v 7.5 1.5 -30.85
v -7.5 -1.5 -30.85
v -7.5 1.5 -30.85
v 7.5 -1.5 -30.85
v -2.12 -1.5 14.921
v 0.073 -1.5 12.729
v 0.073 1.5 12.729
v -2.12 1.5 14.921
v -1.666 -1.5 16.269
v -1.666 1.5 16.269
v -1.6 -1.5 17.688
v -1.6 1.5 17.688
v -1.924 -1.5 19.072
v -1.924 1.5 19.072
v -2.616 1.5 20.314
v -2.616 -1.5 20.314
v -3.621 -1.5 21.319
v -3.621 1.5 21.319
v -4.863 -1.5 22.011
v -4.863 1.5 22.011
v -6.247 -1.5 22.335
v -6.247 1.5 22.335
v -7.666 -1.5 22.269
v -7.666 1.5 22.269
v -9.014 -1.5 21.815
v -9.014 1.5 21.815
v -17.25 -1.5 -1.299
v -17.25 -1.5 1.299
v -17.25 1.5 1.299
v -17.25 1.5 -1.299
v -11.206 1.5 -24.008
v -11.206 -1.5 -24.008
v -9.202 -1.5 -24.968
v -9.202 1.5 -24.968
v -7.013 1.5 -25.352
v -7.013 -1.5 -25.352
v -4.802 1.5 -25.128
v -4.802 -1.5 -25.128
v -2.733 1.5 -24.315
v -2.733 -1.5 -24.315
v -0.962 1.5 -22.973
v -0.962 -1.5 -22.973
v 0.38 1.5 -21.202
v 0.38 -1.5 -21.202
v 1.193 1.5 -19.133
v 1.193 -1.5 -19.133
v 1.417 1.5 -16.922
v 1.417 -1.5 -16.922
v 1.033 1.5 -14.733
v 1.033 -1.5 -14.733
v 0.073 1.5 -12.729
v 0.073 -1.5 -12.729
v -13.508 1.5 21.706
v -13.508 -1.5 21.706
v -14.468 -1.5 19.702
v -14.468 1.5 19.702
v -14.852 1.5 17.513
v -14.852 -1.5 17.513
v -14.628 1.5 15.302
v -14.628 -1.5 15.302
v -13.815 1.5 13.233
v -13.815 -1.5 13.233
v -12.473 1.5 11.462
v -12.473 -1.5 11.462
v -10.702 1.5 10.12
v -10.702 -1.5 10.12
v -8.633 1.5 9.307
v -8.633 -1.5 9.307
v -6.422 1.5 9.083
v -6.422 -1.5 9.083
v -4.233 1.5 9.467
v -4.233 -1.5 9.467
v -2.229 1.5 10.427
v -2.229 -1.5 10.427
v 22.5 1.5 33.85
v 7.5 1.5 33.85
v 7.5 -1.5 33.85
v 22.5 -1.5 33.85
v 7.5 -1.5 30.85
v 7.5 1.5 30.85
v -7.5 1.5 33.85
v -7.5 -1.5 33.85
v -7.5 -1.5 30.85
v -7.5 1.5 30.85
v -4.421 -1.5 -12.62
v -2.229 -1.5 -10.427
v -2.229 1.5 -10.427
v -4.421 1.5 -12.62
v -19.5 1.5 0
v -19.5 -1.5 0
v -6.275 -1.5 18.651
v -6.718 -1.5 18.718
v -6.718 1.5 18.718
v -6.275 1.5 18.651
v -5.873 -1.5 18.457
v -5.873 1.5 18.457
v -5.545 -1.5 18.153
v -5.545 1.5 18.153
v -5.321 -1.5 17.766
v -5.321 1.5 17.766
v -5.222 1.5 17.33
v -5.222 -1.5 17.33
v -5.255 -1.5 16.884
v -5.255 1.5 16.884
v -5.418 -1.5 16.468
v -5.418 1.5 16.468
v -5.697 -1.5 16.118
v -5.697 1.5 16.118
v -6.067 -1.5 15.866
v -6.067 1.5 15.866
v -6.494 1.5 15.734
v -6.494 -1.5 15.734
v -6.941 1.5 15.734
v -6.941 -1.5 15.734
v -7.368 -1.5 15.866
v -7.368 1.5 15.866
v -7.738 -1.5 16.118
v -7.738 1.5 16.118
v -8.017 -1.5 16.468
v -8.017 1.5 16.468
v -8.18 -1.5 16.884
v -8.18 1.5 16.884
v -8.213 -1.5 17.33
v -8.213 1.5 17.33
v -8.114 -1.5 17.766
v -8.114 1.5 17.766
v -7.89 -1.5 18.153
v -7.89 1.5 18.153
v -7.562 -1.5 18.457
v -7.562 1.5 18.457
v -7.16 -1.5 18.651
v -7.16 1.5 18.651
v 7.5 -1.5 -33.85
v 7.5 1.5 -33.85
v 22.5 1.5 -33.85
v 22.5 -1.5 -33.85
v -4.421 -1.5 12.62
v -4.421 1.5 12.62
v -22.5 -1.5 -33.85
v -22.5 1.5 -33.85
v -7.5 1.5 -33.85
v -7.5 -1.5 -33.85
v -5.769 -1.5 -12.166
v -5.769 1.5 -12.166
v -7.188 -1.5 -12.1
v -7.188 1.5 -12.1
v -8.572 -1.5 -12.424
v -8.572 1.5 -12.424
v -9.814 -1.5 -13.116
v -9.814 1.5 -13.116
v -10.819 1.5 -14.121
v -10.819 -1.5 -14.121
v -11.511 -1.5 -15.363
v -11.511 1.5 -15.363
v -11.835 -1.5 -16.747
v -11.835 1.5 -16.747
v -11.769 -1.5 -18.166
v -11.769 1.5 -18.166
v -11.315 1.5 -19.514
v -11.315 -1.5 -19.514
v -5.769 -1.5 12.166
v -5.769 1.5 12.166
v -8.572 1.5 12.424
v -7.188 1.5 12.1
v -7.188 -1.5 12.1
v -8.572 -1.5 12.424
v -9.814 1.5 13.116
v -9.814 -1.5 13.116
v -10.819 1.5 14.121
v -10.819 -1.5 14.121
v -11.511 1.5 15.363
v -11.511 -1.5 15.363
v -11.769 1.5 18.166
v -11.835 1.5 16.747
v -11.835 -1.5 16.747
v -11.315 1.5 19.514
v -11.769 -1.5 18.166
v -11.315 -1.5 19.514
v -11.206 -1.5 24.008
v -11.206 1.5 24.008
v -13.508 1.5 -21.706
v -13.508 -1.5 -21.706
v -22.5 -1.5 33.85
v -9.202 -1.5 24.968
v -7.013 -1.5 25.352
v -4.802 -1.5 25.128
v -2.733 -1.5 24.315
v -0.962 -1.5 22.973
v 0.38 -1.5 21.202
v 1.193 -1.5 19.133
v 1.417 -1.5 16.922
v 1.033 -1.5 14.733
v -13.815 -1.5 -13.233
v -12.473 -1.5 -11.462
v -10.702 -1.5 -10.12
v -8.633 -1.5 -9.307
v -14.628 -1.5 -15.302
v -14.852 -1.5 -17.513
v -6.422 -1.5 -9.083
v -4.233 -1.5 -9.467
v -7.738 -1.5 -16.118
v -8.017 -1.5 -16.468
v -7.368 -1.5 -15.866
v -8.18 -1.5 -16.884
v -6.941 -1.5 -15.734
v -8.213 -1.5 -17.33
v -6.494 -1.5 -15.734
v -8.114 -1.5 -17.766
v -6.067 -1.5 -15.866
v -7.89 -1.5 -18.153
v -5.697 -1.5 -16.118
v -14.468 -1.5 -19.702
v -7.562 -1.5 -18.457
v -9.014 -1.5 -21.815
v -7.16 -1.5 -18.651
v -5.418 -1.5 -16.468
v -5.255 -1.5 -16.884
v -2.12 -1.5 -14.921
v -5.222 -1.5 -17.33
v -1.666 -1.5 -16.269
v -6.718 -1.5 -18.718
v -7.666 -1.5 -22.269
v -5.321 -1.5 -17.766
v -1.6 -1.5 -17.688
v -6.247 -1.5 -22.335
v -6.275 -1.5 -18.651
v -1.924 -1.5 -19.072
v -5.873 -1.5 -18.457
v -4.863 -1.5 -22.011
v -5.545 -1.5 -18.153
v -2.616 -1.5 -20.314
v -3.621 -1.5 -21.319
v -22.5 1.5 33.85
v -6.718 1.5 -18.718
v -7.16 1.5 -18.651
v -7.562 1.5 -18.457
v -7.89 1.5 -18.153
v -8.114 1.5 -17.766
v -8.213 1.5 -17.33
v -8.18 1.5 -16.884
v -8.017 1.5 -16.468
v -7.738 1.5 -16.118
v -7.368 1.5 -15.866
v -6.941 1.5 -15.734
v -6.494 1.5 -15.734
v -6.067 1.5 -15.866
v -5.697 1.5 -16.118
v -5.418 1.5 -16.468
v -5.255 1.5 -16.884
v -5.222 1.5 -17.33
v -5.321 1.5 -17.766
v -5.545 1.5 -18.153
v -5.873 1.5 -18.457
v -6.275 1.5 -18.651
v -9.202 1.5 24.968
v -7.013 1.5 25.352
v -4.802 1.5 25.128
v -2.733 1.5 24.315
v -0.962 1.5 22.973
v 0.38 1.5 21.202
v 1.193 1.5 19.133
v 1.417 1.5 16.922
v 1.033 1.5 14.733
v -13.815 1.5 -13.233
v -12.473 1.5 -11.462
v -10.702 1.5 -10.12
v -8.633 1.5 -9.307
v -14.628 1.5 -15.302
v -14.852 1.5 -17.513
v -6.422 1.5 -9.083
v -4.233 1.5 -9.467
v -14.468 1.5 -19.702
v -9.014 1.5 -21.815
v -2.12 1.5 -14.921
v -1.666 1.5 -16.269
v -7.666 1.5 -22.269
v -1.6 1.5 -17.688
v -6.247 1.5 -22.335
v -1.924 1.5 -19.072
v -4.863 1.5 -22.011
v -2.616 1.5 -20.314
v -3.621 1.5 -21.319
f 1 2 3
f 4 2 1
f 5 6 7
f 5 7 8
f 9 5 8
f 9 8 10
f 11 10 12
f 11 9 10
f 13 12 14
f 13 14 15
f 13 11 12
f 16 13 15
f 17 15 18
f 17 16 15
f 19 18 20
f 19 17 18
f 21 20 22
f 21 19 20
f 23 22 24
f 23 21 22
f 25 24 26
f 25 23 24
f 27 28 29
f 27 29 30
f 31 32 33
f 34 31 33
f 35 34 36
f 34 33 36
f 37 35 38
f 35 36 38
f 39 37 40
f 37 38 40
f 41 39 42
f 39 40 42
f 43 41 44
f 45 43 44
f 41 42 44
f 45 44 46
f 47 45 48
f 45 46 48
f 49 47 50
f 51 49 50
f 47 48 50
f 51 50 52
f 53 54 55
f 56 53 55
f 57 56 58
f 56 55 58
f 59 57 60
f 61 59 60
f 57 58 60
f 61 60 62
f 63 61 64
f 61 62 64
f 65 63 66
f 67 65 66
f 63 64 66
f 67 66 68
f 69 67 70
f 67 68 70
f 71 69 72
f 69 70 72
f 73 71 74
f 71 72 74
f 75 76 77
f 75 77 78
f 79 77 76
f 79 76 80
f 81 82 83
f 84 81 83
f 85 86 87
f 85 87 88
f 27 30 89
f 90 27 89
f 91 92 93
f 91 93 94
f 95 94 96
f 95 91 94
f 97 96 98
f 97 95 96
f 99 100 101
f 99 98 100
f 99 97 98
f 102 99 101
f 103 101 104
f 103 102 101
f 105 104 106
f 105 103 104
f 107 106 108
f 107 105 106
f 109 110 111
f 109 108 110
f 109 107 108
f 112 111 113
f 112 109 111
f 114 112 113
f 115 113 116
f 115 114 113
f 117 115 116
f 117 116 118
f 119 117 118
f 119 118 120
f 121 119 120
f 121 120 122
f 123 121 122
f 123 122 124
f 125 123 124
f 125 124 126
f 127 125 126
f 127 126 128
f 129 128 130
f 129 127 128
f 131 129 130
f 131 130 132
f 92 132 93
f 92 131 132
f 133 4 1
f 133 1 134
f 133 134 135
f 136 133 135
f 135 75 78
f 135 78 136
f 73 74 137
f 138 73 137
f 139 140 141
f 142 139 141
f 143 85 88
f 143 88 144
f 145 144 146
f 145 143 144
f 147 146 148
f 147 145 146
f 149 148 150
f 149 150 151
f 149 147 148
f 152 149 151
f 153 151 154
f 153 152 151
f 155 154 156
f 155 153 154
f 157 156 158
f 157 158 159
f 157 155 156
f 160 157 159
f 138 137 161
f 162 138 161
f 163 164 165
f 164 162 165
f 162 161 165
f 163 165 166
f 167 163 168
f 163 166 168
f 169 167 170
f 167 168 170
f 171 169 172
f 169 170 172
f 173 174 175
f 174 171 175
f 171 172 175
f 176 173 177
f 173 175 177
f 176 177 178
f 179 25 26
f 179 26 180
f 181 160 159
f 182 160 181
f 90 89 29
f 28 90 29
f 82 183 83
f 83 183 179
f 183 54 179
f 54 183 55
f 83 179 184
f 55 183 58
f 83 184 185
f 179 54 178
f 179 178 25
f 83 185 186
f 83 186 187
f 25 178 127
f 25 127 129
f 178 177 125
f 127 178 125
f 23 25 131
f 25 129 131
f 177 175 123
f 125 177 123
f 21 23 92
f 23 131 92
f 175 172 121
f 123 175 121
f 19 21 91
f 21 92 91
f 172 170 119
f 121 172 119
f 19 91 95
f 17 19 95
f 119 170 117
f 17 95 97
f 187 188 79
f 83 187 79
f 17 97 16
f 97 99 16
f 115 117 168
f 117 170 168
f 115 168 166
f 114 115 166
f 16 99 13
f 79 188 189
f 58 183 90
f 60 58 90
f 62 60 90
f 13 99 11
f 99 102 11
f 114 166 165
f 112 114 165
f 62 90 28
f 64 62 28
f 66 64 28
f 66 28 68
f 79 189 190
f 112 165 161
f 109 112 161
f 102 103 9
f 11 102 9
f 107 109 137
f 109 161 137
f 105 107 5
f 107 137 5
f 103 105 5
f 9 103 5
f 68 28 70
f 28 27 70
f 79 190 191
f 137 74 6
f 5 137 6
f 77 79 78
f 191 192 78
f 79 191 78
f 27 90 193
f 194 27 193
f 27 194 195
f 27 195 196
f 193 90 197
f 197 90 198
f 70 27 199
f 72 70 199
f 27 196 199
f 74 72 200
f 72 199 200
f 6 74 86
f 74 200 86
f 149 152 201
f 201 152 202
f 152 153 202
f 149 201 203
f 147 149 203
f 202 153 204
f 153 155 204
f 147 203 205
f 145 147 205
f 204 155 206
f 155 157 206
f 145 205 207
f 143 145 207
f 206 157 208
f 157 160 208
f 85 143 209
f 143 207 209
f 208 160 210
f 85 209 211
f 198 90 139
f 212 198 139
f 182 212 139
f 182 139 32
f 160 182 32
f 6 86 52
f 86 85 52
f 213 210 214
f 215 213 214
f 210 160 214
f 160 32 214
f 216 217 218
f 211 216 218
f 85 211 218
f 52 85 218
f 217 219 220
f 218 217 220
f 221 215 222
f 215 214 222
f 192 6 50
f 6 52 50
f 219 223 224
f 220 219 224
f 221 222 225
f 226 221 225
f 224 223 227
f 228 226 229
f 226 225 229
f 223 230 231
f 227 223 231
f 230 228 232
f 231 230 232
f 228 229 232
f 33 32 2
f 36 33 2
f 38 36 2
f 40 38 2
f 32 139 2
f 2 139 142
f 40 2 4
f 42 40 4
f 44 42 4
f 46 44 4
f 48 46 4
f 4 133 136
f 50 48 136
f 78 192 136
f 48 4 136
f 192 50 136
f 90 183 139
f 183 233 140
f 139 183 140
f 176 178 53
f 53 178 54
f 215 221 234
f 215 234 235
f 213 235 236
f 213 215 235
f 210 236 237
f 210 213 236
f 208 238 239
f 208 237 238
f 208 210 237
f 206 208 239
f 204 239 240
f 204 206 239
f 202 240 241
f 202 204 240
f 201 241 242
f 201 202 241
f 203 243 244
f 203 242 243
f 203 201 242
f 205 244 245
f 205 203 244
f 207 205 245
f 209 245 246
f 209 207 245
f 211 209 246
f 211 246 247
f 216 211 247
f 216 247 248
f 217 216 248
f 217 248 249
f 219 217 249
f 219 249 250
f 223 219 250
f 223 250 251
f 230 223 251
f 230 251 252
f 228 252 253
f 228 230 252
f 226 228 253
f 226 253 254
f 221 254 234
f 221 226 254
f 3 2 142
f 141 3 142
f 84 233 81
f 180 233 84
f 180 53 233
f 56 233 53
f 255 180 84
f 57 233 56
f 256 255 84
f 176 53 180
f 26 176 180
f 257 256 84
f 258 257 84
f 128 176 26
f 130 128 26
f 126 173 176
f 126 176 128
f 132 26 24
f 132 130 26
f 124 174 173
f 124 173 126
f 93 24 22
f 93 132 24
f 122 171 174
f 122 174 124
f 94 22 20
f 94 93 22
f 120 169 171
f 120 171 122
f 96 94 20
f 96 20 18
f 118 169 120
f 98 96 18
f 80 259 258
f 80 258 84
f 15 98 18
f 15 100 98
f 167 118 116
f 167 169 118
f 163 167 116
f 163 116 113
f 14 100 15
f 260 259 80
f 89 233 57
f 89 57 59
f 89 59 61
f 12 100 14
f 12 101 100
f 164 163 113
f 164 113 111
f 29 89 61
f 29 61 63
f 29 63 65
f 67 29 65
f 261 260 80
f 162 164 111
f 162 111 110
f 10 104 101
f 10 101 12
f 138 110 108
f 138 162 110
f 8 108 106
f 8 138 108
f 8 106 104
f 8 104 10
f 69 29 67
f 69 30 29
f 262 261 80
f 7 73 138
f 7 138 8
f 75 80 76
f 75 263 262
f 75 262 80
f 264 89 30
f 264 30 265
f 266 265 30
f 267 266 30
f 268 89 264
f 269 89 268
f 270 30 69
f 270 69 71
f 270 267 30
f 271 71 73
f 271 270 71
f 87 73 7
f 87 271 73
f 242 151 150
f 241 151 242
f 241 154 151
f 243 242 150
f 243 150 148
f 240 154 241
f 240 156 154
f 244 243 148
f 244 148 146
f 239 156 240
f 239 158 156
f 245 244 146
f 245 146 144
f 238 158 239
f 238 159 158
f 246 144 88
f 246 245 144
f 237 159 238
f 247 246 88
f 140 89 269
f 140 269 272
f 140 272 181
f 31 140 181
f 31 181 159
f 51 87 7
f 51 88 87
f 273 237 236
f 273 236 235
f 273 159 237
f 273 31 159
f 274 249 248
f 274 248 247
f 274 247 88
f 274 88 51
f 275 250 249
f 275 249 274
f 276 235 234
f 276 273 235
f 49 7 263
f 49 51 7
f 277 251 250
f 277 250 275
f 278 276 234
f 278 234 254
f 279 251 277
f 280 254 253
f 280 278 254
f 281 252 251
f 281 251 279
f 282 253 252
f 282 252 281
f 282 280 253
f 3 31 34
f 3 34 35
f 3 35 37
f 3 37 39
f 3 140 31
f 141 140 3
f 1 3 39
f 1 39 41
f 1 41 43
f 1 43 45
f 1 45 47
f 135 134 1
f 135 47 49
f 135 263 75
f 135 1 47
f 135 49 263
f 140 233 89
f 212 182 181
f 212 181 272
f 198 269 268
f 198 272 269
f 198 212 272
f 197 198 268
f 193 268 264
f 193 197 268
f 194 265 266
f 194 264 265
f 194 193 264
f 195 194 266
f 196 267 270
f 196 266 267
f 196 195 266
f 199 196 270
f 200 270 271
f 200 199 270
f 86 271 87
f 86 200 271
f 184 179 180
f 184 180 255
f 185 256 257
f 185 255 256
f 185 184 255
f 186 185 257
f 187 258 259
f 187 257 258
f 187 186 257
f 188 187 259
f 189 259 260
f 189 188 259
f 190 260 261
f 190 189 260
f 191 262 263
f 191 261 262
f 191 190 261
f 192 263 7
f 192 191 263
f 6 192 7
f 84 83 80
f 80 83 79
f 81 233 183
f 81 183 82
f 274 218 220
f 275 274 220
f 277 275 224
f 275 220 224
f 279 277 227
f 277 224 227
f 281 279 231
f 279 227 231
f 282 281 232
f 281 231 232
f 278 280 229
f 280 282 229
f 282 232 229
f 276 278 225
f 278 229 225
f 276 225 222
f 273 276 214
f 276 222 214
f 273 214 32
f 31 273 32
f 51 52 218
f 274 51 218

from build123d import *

# Parameters (mm, degrees)
SKETCH1_W               = 45
SKETCH1_H               = 67.7
BOSS_EXTRUDE1_DEPTH     = 1.5
CUT_EXTRUDE1_DEPTH      = 41.67336352
CUT_EXTRUDE1_DEPTH_BACK = 41.67336352
SKETCH2_W               = 15
SKETCH2_H               = 3
CUT_EXTRUDE2_DEPTH      = 41.67336352
CUT_EXTRUDE2_DEPTH_BACK = 41.67336352
SKETCH3_R               = 1.5
CUT_EXTRUDE3_DEPTH      = 41.67336352
CUT_EXTRUDE3_DEPTH_BACK = 41.67336352


with BuildPart() as part:
    # Sketch1 → Boss-Extrude1 (new, symmetric)
    with BuildSketch(Plane(origin=(0, 0, 0), x_dir=(1, 0, 0), z_dir=(0, 1, 0))):
        Rectangle(SKETCH1_W, SKETCH1_H)
    extrude(amount=BOSS_EXTRUDE1_DEPTH, both=True)

    # Sketch2 → Cut-Extrude1 (cut, two sides: drawn at the far end of the back side and taken through both)
    with BuildSketch(Plane(origin=(0, 0, 0), x_dir=(1, 0, 0), z_dir=(0, 1, 0)).offset(-CUT_EXTRUDE1_DEPTH_BACK)):
        with Locations((0, -32.35)):
            Rectangle(SKETCH2_W, SKETCH2_H)
        with Locations((0, 32.35)):
            Rectangle(SKETCH2_W, SKETCH2_H)
    extrude(amount=CUT_EXTRUDE1_DEPTH + CUT_EXTRUDE1_DEPTH_BACK, mode=Mode.SUBTRACT)

    # Sketch3 → Cut-Extrude2 (cut, two sides: drawn at the far end of the back side and taken through both)
    with BuildSketch(Plane(origin=(0, 0, 0), x_dir=(1, 0, 0), z_dir=(0, 1, 0)).offset(-CUT_EXTRUDE2_DEPTH_BACK)):
        with Locations(Location((-6.717514421, -17.217514421, 0), (0, 0, 270))):
            Circle(SKETCH3_R)
        with Locations(Location((-6.717514421, 17.217514421, 0), (0, 0, 90))):
            Circle(SKETCH3_R)
        with BuildLine():
            Line((0.072542026, 12.729181386), (-2.119583462, 14.921306874))
            ThreePointArc((-2.119583462, 14.921306874), (-3.083402548, 20.851626294), (-9.013721969, 21.815445381))
            Line((-9.013721969, 21.815445381), (-11.205847457, 24.007570869))
            ThreePointArc((-11.205847457, 24.007570869), (-0.962082205, 22.972946638), (0.072542026, 12.729181386))
        make_face()
        with BuildLine():
            Line((-2.229181386, 10.427457974), (-4.421306874, 12.619583462))
            ThreePointArc((-4.421306874, 12.619583462), (-10.351626294, 13.583402548), (-11.315445381, 19.513721969))
            Line((-11.315445381, 19.513721969), (-13.507570869, 21.705847457))
            ThreePointArc((-13.507570869, 21.705847457), (-12.472946638, 11.462082205), (-2.229181386, 10.427457974))
        make_face()
        with BuildLine():
            Line((0.072542026, -12.729181386), (-2.119583462, -14.921306874))
            ThreePointArc((-2.119583462, -14.921306874), (-3.083402548, -20.851626294), (-9.013721969, -21.815445381))
            Line((-9.013721969, -21.815445381), (-11.205847457, -24.007570869))
            ThreePointArc((-11.205847457, -24.007570869), (-0.962082205, -22.972946638), (0.072542026, -12.729181386))
        make_face()
        with BuildLine():
            Line((-2.229181386, -10.427457974), (-4.421306874, -12.619583462))
            ThreePointArc((-4.421306874, -12.619583462), (-10.351626294, -13.583402548), (-11.315445381, -19.513721969))
            Line((-11.315445381, -19.513721969), (-13.507570869, -21.705847457))
            ThreePointArc((-13.507570869, -21.705847457), (-12.472946638, -11.462082205), (-2.229181386, -10.427457974))
        make_face()
    extrude(amount=CUT_EXTRUDE2_DEPTH + CUT_EXTRUDE2_DEPTH_BACK, mode=Mode.SUBTRACT)

    # Sketch4 → Cut-Extrude3 (cut, two sides: drawn at the far end of the back side and taken through both)
    with BuildSketch(Plane(origin=(0, 0, 0), x_dir=(1, 0, 0), z_dir=(0, 1, 0)).offset(-CUT_EXTRUDE3_DEPTH_BACK)):
        Polygon((-19.5, 0), (-17.25, -1.299038106), (-17.25, 1.299038106), align=None)
    extrude(amount=CUT_EXTRUDE3_DEPTH + CUT_EXTRUDE3_DEPTH_BACK, mode=Mode.SUBTRACT)


solid = part.part
